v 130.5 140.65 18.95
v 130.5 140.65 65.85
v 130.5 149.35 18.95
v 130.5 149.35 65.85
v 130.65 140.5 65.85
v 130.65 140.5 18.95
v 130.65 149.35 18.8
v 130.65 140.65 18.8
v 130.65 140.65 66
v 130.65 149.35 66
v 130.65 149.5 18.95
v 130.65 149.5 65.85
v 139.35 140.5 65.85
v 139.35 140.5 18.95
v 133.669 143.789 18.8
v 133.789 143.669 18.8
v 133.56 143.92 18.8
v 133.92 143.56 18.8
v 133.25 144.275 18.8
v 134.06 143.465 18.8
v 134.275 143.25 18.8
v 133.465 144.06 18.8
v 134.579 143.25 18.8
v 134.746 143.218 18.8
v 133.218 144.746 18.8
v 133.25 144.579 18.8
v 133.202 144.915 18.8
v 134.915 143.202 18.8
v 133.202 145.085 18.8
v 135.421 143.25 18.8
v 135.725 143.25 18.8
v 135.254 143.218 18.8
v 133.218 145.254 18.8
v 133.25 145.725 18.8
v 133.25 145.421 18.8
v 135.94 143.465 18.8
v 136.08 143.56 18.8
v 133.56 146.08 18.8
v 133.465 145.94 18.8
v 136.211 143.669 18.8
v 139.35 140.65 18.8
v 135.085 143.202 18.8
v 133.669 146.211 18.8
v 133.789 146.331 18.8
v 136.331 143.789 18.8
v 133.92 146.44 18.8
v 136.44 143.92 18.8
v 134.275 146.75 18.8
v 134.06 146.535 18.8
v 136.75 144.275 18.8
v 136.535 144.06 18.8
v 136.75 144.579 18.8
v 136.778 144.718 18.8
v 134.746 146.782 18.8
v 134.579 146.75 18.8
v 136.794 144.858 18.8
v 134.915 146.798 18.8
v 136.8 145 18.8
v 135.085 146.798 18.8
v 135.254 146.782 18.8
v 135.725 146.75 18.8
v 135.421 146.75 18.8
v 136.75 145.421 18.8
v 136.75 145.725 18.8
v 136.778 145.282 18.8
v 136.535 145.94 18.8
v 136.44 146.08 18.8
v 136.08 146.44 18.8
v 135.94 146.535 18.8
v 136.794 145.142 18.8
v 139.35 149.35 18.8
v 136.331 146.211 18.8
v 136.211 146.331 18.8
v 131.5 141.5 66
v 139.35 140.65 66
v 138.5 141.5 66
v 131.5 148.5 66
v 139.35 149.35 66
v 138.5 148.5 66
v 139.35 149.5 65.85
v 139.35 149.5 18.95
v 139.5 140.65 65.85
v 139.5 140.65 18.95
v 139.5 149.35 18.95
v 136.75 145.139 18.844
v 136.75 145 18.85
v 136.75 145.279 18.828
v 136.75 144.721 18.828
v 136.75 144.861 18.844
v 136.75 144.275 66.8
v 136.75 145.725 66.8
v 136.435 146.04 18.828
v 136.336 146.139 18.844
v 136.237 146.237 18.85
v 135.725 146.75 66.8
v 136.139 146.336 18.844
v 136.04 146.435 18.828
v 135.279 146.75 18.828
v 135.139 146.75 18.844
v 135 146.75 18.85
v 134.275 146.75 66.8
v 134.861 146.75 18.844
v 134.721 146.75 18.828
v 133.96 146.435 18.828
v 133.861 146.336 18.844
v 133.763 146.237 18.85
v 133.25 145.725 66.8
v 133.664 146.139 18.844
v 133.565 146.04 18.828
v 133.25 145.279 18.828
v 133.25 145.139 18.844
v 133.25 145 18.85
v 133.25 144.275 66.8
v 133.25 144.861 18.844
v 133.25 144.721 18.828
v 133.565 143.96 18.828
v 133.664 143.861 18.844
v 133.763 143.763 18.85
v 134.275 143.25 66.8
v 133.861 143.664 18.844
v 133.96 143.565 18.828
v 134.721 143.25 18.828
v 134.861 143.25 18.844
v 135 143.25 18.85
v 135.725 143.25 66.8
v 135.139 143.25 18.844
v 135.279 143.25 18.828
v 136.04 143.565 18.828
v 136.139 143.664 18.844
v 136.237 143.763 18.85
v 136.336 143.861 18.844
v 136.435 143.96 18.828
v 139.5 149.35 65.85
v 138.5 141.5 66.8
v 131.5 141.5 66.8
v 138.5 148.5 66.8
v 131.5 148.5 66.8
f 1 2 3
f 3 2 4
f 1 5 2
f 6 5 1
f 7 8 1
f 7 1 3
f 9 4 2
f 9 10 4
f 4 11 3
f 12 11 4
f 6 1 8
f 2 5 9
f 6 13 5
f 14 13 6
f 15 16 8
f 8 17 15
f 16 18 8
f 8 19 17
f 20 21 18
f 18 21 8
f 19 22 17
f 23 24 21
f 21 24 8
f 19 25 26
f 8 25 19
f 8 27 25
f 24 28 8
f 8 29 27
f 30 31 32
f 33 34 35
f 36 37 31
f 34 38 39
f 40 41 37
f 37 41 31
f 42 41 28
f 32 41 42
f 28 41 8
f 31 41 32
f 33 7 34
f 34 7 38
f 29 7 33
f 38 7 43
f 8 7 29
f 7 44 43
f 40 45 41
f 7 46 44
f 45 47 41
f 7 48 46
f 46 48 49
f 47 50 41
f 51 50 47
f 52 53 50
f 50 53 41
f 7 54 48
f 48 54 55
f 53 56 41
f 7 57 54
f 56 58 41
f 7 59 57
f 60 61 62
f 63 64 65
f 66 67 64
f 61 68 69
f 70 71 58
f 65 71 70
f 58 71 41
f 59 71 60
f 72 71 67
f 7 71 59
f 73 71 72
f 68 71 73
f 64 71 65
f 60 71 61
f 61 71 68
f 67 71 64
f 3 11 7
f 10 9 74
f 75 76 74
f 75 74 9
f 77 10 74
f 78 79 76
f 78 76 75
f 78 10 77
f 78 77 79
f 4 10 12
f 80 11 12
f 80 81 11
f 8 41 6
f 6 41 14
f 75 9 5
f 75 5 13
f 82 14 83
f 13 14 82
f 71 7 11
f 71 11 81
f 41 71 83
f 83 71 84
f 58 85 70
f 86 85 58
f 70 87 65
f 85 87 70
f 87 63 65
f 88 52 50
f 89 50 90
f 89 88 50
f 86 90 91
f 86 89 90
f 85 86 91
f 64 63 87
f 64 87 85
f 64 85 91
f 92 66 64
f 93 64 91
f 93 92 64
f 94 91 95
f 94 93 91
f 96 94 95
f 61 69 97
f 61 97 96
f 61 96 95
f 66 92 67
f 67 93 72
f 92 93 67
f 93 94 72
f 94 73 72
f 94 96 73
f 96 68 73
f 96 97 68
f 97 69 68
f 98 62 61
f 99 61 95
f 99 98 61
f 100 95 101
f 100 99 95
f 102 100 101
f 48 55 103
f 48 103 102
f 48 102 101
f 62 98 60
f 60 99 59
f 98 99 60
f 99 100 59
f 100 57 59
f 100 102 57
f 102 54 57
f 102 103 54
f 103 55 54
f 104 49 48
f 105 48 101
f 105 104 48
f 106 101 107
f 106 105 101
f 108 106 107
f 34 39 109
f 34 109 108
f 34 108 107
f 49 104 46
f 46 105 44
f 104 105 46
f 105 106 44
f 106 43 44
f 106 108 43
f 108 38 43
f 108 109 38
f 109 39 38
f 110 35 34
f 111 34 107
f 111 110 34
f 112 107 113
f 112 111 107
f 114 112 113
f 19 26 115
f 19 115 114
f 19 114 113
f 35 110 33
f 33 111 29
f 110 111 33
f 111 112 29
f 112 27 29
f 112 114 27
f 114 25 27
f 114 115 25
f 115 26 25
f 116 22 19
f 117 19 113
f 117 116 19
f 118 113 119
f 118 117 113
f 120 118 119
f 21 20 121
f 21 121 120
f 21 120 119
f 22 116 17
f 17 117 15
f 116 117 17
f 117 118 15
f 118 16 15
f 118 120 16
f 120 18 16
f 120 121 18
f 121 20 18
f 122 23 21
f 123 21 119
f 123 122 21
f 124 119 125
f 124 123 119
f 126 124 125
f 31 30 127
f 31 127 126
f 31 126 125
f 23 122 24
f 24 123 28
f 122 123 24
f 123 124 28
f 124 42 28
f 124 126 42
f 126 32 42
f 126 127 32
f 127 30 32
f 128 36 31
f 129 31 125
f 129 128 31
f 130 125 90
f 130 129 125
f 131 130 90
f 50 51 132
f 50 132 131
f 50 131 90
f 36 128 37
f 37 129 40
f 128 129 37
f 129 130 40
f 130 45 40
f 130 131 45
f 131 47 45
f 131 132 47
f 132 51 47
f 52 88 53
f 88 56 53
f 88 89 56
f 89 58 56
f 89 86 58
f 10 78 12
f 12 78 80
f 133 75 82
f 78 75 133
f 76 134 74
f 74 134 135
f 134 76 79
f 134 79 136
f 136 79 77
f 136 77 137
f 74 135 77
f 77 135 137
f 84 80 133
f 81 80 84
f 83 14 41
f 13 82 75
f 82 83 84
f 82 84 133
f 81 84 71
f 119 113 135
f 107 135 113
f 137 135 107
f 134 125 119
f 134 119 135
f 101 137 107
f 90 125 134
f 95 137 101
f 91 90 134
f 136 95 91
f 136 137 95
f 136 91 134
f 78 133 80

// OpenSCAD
// Generated by the canonical parent Python sources and validated exchange pipeline.
polyhedron(points=[[130.5, 140.64999389648438, 18.950000762939453], [130.5, 140.64999389648438, 65.8499984741211], [130.5, 149.35000610351562, 18.950000762939453], [130.5, 149.35000610351562, 65.8499984741211], [130.64999389648438, 140.5, 65.8499984741211], [130.64999389648438, 140.5, 18.950000762939453], [130.64999389648438, 149.35000610351562, 18.799999237060547], [130.64999389648438, 140.64999389648438, 18.799999237060547], [130.64999389648438, 140.64999389648438, 66.0], [130.64999389648438, 149.35000610351562, 66.0], [130.64999389648438, 149.5, 18.950000762939453], [130.64999389648438, 149.5, 65.8499984741211], [139.35000610351562, 140.5, 65.8499984741211], [139.35000610351562, 140.5, 18.950000762939453], [133.66851806640625, 143.7887420654297, 18.799999237060547], [133.7887420654297, 143.66851806640625, 18.799999237060547], [133.56016540527344, 143.91978454589844, 18.799999237060547], [133.91978454589844, 143.56016540527344, 18.799999237060547], [133.25, 144.27513122558594, 18.799999237060547], [134.0604705810547, 143.46466064453125, 18.799999237060547], [134.27513122558594, 143.25, 18.799999237060547], [133.46466064453125, 144.0604705810547, 18.799999237060547], [134.5786895751953, 143.25, 18.799999237060547], [134.74569702148438, 143.21804809570312, 18.799999237060547], [133.21804809570312, 144.74569702148438, 18.799999237060547], [133.25, 144.5786895751953, 18.799999237060547], [133.20201110839844, 144.91497802734375, 18.799999237060547], [134.91497802734375, 143.20201110839844, 18.799999237060547], [133.20201110839844, 145.08502197265625, 18.799999237060547], [135.4213104248047, 143.25, 18.799999237060547], [135.72486877441406, 143.25, 18.799999237060547], [135.25430297851562, 143.21804809570312, 18.799999237060547], [133.21804809570312, 145.25430297851562, 18.799999237060547], [133.25, 145.72486877441406, 18.799999237060547], [133.25, 145.4213104248047, 18.799999237060547], [135.9395294189453, 143.46466064453125, 18.799999237060547], [136.08021545410156, 143.56016540527344, 18.799999237060547], [133.56016540527344, 146.08021545410156, 18.799999237060547], [133.46466064453125, 145.9395294189453, 18.799999237060547], [136.2112579345703, 143.66851806640625, 18.799999237060547], [139.35000610351562, 140.64999389648438, 18.799999237060547], [135.08502197265625, 143.20201110839844, 18.799999237060547], [133.66851806640625, 146.2112579345703, 18.799999237060547], [133.7887420654297, 146.33148193359375, 18.799999237060547], [136.33148193359375, 143.7887420654297, 18.799999237060547], [133.91978454589844, 146.43983459472656, 18.799999237060547], [136.43983459472656, 143.91978454589844, 18.799999237060547], [134.27513122558594, 146.75, 18.799999237060547], [134.0604705810547, 146.53533935546875, 18.799999237060547], [136.75, 144.27513122558594, 18.799999237060547], [136.53533935546875, 144.0604705810547, 18.799999237060547], [136.75, 144.5786895751953, 18.799999237060547], [136.77772521972656, 144.71766662597656, 18.799999237060547], [134.74569702148438, 146.78195190429688, 18.799999237060547], [134.5786895751953, 146.75, 18.799999237060547], [136.79441833496094, 144.8583984375, 18.799999237060547], [134.91497802734375, 146.79798889160156, 18.799999237060547], [136.8000030517578, 145.0, 18.799999237060547], [135.08502197265625, 146.79798889160156, 18.799999237060547], [135.25430297851562, 146.78195190429688, 18.799999237060547], [135.72486877441406, 146.75, 18.799999237060547], [135.4213104248047, 146.75, 18.799999237060547], [136.75, 145.4213104248047, 18.799999237060547], [136.75, 145.72486877441406, 18.799999237060547], [136.77772521972656, 145.28233337402344, 18.799999237060547], [136.53533935546875, 145.9395294189453, 18.799999237060547], [136.43983459472656, 146.08021545410156, 18.799999237060547], [136.08021545410156, 146.43983459472656, 18.799999237060547], [135.9395294189453, 146.53533935546875, 18.799999237060547], [136.79441833496094, 145.1416015625, 18.799999237060547], [139.35000610351562, 149.35000610351562, 18.799999237060547], [136.33148193359375, 146.2112579345703, 18.799999237060547], [136.2112579345703, 146.33148193359375, 18.799999237060547], [131.5, 141.5, 66.0], [139.35000610351562, 140.64999389648438, 66.0], [138.5, 141.5, 66.0], [131.5, 148.5, 66.0], [139.35000610351562, 149.35000610351562, 66.0], [138.5, 148.5, 66.0], [139.35000610351562, 149.5, 65.8499984741211], [139.35000610351562, 149.5, 18.950000762939453], [139.5, 140.64999389648438, 65.8499984741211], [139.5, 140.64999389648438, 18.950000762939453], [139.5, 149.35000610351562, 18.950000762939453], [136.75, 145.13926696777344, 18.844467163085938], [136.75, 145.0, 18.850000381469727], [136.75, 145.27940368652344, 18.827836990356445], [136.75, 144.72059631347656, 18.827836990356445], [136.75, 144.86073303222656, 18.844467163085938], [136.75, 144.27513122558594, 66.80000305175781], [136.75, 145.72486877441406, 66.80000305175781], [136.43499755859375, 146.0398712158203, 18.827836990356445], [136.33590698242188, 146.1389617919922, 18.844467163085938], [136.23744201660156, 146.23744201660156, 18.850000381469727], [135.72486877441406, 146.75, 66.80000305175781], [136.1389617919922, 146.33590698242188, 18.844467163085938], [136.0398712158203, 146.43499755859375, 18.827836990356445], [135.27940368652344, 146.75, 18.827836990356445], [135.13926696777344, 146.75, 18.844467163085938], [135.0, 146.75, 18.850000381469727], [134.27513122558594, 146.75, 66.80000305175781], [134.86073303222656, 146.75, 18.844467163085938], [134.72059631347656, 146.75, 18.827836990356445], [133.9601287841797, 146.43499755859375, 18.827836990356445], [133.8610382080078, 146.33590698242188, 18.844467163085938], [133.76255798339844, 146.23744201660156, 18.850000381469727], [133.25, 145.72486877441406, 66.80000305175781], [133.66409301757812, 146.1389617919922, 18.844467163085938], [133.56500244140625, 146.0398712158203, 18.827836990356445], [133.25, 145.27940368652344, 18.827836990356445], [133.25, 145.13926696777344, 18.844467163085938], [133.25, 145.0, 18.850000381469727], [133.25, 144.27513122558594, 66.80000305175781], [133.25, 144.86073303222656, 18.844467163085938], [133.25, 144.72059631347656, 18.827836990356445], [133.56500244140625, 143.9601287841797, 18.827836990356445], [133.66409301757812, 143.8610382080078, 18.844467163085938], [133.76255798339844, 143.76255798339844, 18.850000381469727], [134.27513122558594, 143.25, 66.80000305175781], [133.8610382080078, 143.66409301757812, 18.844467163085938], [133.9601287841797, 143.56500244140625, 18.827836990356445], [134.72059631347656, 143.25, 18.827836990356445], [134.86073303222656, 143.25, 18.844467163085938], [135.0, 143.25, 18.850000381469727], [135.72486877441406, 143.25, 66.80000305175781], [135.13926696777344, 143.25, 18.844467163085938], [135.27940368652344, 143.25, 18.827836990356445], [136.0398712158203, 143.56500244140625, 18.827836990356445], [136.1389617919922, 143.66409301757812, 18.844467163085938], [136.23744201660156, 143.76255798339844, 18.850000381469727], [136.33590698242188, 143.8610382080078, 18.844467163085938], [136.43499755859375, 143.9601287841797, 18.827836990356445], [139.5, 149.35000610351562, 65.8499984741211], [138.5, 141.5, 66.80000305175781], [131.5, 141.5, 66.80000305175781], [138.5, 148.5, 66.80000305175781], [131.5, 148.5, 66.80000305175781]],faces=[[2, 1, 0], [3, 1, 2], [1, 4, 0], [0, 4, 5], [0, 7, 6], [2, 0, 6], [1, 3, 8], [3, 9, 8], [2, 10, 3], [3, 10, 11], [7, 0, 5], [8, 4, 1], [4, 12, 5], [5, 12, 13], [7, 15, 14], [14, 16, 7], [7, 17, 15], [16, 18, 7], [17, 20, 19], [7, 20, 17], [16, 21, 18], [20, 23, 22], [7, 23, 20], [25, 24, 18], [18, 24, 7], [24, 26, 7], [7, 27, 23], [26, 28, 7], [31, 30, 29], [34, 33, 32], [30, 36, 35], [38, 37, 33], [36, 40, 39], [30, 40, 36], [27, 40, 41], [41, 40, 31], [7, 40, 27], [31, 40, 30], [33, 6, 32], [37, 6, 33], [32, 6, 28], [42, 6, 37], [28, 6, 7], [42, 43, 6], [40, 44, 39], [43, 45, 6], [40, 46, 44], [45, 47, 6], [48, 47, 45], [40, 49, 46], [46, 49, 50], [49, 52, 51], [40, 52, 49], [47, 53, 6], [54, 53, 47], [40, 55, 52], [53, 56, 6], [40, 57, 55], [56, 58, 6], [61, 60, 59], [64, 63, 62], [63, 66, 65], [68, 67, 60], [57, 70, 69], [69, 70, 64], [40, 70, 57], [59, 70, 58], [66, 70, 71], [58, 70, 6], [71, 70, 72], [72, 70, 67], [64, 70, 63], [60, 70, 59], [67, 70, 60], [63, 70, 66], [6, 10, 2], [73, 8, 9], [73, 75, 74], [8, 73, 74], [73, 9, 76], [75, 78, 77], [74, 75, 77], [76, 9, 77], [78, 76, 77], [11, 9, 3], [11, 10, 79], [10, 80, 79], [5, 40, 7], [13, 40, 5], [4, 8, 74], [12, 4, 74], [82, 13, 81], [81, 13, 12], [10, 6, 70], [80, 10, 70], [82, 70, 40], [83, 70, 82], [69, 84, 57], [57, 84, 85], [64, 86, 69], [69, 86, 84], [64, 62, 86], [49, 51, 87], [89, 49, 88], [49, 87, 88], [90, 89, 85], [89, 88, 85], [90, 85, 84], [86, 62, 63], [84, 86, 63], [90, 84, 63], [63, 65, 91], [90, 63, 92], [63, 91, 92], [94, 90, 93], [90, 92, 93], [94, 93, 95], [96, 68, 60], [95, 96, 60], [94, 95, 60], [66, 91, 65], [71, 92, 66], [66, 92, 91], [71, 93, 92], [71, 72, 93], [72, 95, 93], [72, 67, 95], [67, 96, 95], [67, 68, 96], [60, 61, 97], [94, 60, 98], [60, 97, 98], [100, 94, 99], [94, 98, 99], [100, 99, 101], [102, 54, 47], [101, 102, 47], [100, 101, 47], [59, 97, 61], [58, 98, 59], [59, 98, 97], [58, 99, 98], [58, 56, 99], [56, 101, 99], [56, 53, 101], [53, 102, 101], [53, 54, 102], [47, 48, 103], [100, 47, 104], [47, 103, 104], [106, 100, 105], [100, 104, 105], [106, 105, 107], [108, 38, 33], [107, 108, 33], [106, 107, 33], [45, 103, 48], [43, 104, 45], [45, 104, 103], [43, 105, 104], [43, 42, 105], [42, 107, 105], [42, 37, 107], [37, 108, 107], [37, 38, 108], [33, 34, 109], [106, 33, 110], [33, 109, 110], [112, 106, 111], [106, 110, 111], [112, 111, 113], [114, 25, 18], [113, 114, 18], [112, 113, 18], [32, 109, 34], [28, 110, 32], [32, 110, 109], [28, 111, 110], [28, 26, 111], [26, 113, 111], [26, 24, 113], [24, 114, 113], [24, 25, 114], [18, 21, 115], [112, 18, 116], [18, 115, 116], [118, 112, 117], [112, 116, 117], [118, 117, 119], [120, 19, 20], [119, 120, 20], [118, 119, 20], [16, 115, 21], [14, 116, 16], [16, 116, 115], [14, 117, 116], [14, 15, 117], [15, 119, 117], [15, 17, 119], [17, 120, 119], [17, 19, 120], [20, 22, 121], [118, 20, 122], [20, 121, 122], [124, 118, 123], [118, 122, 123], [124, 123, 125], [126, 29, 30], [125, 126, 30], [124, 125, 30], [23, 121, 22], [27, 122, 23], [23, 122, 121], [27, 123, 122], [27, 41, 123], [41, 125, 123], [41, 31, 125], [31, 126, 125], [31, 29, 126], [30, 35, 127], [124, 30, 128], [30, 127, 128], [89, 124, 129], [124, 128, 129], [89, 129, 130], [131, 50, 49], [130, 131, 49], [89, 130, 49], [36, 127, 35], [39, 128, 36], [36, 128, 127], [39, 129, 128], [39, 44, 129], [44, 130, 129], [44, 46, 130], [46, 131, 130], [46, 50, 131], [52, 87, 51], [52, 55, 87], [55, 88, 87], [55, 57, 88], [57, 85, 88], [11, 77, 9], [79, 77, 11], [81, 74, 132], [132, 74, 77], [73, 133, 75], [134, 133, 73], [78, 75, 133], [135, 78, 133], [76, 78, 135], [136, 76, 135], [76, 134, 73], [136, 134, 76], [132, 79, 83], [83, 79, 80], [40, 13, 82], [74, 81, 12], [83, 82, 81], [132, 83, 81], [70, 83, 80], [134, 112, 118], [112, 134, 106], [106, 134, 136], [118, 124, 133], [134, 118, 133], [106, 136, 100], [133, 124, 89], [100, 136, 94], [133, 89, 90], [90, 94, 135], [94, 136, 135], [133, 90, 135], [79, 132, 77]],convexity=10);
